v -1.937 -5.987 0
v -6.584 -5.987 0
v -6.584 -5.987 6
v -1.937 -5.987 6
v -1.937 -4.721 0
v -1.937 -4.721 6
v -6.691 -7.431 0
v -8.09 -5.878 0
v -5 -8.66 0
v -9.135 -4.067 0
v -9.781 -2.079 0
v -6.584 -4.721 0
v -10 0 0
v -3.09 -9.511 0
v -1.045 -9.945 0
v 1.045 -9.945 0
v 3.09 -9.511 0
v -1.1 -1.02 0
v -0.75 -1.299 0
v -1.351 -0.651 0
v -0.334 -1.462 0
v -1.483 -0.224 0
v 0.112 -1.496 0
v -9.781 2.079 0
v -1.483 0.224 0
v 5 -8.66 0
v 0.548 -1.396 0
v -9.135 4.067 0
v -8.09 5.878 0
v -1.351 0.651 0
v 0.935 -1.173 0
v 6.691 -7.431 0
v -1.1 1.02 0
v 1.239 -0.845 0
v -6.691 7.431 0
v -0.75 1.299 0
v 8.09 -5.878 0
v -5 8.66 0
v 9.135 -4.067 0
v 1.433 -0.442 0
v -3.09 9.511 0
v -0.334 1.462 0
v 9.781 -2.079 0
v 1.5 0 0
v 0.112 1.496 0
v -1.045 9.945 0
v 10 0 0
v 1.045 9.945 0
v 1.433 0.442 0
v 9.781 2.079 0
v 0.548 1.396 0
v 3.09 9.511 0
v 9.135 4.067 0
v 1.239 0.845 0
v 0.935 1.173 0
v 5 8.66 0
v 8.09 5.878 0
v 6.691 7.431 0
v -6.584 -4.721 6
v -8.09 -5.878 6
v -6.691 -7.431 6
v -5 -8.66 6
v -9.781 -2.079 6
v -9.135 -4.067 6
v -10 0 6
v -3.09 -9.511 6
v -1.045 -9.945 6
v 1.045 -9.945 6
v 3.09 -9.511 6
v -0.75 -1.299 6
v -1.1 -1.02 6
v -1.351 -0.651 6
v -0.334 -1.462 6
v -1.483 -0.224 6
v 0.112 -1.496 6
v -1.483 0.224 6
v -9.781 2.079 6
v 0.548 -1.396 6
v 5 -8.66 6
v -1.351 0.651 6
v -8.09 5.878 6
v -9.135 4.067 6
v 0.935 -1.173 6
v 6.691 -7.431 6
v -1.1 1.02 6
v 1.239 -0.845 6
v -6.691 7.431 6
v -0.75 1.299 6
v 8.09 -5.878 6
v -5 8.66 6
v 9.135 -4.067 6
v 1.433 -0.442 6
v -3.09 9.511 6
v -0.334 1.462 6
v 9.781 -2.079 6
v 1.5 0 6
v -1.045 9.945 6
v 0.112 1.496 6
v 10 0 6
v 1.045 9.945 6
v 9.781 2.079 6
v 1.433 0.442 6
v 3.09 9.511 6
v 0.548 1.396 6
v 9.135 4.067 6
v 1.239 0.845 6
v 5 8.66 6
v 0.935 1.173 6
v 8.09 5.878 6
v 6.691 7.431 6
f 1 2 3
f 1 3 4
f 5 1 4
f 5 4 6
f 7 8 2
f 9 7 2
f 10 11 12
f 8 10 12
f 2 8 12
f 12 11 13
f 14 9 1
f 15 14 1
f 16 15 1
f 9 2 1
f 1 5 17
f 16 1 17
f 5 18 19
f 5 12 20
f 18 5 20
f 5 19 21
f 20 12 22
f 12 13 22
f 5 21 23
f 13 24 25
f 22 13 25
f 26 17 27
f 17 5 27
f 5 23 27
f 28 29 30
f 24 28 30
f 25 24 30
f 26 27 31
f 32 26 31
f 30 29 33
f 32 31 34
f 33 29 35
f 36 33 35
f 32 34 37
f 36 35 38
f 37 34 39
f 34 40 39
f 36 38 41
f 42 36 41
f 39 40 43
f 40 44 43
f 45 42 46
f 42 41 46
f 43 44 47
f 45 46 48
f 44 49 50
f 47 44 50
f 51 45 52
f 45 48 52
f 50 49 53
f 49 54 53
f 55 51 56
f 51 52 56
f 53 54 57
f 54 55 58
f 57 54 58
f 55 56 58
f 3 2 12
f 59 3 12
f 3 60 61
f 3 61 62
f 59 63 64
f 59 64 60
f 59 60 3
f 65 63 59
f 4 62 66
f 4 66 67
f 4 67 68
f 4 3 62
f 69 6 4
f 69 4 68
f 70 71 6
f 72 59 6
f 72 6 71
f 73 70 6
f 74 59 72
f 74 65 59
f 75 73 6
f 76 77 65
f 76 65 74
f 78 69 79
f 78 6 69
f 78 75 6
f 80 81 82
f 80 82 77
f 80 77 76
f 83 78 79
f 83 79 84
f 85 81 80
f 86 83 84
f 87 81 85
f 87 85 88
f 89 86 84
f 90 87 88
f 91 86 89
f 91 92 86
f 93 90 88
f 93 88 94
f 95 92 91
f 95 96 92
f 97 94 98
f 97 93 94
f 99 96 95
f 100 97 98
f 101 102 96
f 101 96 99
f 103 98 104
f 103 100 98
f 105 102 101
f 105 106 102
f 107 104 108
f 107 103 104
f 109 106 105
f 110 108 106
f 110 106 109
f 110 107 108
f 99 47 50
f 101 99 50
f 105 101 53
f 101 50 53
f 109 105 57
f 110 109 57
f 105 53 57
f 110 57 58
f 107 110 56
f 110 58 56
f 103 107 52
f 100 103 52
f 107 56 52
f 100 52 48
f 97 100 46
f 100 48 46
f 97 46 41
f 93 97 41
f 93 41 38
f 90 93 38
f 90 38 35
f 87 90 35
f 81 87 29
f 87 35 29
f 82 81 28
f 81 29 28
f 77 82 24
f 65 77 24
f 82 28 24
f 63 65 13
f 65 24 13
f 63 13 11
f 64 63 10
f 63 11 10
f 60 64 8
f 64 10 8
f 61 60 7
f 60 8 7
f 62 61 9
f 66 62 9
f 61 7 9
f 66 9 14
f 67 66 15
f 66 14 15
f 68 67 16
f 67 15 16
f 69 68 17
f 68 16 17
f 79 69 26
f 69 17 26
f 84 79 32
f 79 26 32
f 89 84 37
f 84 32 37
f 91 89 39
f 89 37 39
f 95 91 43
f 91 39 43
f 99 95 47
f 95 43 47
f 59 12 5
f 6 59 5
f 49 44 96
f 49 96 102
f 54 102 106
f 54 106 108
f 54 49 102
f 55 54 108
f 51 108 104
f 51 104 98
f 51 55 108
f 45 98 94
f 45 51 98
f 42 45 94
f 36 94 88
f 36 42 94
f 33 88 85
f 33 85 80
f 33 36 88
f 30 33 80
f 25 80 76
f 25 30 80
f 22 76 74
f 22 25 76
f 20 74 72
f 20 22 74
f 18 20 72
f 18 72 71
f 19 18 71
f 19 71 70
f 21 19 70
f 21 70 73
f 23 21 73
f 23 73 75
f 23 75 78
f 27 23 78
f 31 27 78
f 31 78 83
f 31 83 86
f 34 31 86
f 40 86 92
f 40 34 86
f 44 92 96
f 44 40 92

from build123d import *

# Parameters (mm, degrees)
F0_R     = 10
F0_W     = 4.646443
F0_H     = 1.266593
F0_R_2   = 1.5
F1_DEPTH = 6


with BuildPart() as f1:
    # F0 (on Top) → F1 (new body)
    with BuildSketch(Plane.XY):
        Circle(F0_R)
        with Locations((-4.260709, -5.35391)):
            Rectangle(F0_W, F0_H, mode=Mode.SUBTRACT)
        Circle(F0_R_2, mode=Mode.SUBTRACT)
    extrude(amount=F1_DEPTH)


solid = f1.part
